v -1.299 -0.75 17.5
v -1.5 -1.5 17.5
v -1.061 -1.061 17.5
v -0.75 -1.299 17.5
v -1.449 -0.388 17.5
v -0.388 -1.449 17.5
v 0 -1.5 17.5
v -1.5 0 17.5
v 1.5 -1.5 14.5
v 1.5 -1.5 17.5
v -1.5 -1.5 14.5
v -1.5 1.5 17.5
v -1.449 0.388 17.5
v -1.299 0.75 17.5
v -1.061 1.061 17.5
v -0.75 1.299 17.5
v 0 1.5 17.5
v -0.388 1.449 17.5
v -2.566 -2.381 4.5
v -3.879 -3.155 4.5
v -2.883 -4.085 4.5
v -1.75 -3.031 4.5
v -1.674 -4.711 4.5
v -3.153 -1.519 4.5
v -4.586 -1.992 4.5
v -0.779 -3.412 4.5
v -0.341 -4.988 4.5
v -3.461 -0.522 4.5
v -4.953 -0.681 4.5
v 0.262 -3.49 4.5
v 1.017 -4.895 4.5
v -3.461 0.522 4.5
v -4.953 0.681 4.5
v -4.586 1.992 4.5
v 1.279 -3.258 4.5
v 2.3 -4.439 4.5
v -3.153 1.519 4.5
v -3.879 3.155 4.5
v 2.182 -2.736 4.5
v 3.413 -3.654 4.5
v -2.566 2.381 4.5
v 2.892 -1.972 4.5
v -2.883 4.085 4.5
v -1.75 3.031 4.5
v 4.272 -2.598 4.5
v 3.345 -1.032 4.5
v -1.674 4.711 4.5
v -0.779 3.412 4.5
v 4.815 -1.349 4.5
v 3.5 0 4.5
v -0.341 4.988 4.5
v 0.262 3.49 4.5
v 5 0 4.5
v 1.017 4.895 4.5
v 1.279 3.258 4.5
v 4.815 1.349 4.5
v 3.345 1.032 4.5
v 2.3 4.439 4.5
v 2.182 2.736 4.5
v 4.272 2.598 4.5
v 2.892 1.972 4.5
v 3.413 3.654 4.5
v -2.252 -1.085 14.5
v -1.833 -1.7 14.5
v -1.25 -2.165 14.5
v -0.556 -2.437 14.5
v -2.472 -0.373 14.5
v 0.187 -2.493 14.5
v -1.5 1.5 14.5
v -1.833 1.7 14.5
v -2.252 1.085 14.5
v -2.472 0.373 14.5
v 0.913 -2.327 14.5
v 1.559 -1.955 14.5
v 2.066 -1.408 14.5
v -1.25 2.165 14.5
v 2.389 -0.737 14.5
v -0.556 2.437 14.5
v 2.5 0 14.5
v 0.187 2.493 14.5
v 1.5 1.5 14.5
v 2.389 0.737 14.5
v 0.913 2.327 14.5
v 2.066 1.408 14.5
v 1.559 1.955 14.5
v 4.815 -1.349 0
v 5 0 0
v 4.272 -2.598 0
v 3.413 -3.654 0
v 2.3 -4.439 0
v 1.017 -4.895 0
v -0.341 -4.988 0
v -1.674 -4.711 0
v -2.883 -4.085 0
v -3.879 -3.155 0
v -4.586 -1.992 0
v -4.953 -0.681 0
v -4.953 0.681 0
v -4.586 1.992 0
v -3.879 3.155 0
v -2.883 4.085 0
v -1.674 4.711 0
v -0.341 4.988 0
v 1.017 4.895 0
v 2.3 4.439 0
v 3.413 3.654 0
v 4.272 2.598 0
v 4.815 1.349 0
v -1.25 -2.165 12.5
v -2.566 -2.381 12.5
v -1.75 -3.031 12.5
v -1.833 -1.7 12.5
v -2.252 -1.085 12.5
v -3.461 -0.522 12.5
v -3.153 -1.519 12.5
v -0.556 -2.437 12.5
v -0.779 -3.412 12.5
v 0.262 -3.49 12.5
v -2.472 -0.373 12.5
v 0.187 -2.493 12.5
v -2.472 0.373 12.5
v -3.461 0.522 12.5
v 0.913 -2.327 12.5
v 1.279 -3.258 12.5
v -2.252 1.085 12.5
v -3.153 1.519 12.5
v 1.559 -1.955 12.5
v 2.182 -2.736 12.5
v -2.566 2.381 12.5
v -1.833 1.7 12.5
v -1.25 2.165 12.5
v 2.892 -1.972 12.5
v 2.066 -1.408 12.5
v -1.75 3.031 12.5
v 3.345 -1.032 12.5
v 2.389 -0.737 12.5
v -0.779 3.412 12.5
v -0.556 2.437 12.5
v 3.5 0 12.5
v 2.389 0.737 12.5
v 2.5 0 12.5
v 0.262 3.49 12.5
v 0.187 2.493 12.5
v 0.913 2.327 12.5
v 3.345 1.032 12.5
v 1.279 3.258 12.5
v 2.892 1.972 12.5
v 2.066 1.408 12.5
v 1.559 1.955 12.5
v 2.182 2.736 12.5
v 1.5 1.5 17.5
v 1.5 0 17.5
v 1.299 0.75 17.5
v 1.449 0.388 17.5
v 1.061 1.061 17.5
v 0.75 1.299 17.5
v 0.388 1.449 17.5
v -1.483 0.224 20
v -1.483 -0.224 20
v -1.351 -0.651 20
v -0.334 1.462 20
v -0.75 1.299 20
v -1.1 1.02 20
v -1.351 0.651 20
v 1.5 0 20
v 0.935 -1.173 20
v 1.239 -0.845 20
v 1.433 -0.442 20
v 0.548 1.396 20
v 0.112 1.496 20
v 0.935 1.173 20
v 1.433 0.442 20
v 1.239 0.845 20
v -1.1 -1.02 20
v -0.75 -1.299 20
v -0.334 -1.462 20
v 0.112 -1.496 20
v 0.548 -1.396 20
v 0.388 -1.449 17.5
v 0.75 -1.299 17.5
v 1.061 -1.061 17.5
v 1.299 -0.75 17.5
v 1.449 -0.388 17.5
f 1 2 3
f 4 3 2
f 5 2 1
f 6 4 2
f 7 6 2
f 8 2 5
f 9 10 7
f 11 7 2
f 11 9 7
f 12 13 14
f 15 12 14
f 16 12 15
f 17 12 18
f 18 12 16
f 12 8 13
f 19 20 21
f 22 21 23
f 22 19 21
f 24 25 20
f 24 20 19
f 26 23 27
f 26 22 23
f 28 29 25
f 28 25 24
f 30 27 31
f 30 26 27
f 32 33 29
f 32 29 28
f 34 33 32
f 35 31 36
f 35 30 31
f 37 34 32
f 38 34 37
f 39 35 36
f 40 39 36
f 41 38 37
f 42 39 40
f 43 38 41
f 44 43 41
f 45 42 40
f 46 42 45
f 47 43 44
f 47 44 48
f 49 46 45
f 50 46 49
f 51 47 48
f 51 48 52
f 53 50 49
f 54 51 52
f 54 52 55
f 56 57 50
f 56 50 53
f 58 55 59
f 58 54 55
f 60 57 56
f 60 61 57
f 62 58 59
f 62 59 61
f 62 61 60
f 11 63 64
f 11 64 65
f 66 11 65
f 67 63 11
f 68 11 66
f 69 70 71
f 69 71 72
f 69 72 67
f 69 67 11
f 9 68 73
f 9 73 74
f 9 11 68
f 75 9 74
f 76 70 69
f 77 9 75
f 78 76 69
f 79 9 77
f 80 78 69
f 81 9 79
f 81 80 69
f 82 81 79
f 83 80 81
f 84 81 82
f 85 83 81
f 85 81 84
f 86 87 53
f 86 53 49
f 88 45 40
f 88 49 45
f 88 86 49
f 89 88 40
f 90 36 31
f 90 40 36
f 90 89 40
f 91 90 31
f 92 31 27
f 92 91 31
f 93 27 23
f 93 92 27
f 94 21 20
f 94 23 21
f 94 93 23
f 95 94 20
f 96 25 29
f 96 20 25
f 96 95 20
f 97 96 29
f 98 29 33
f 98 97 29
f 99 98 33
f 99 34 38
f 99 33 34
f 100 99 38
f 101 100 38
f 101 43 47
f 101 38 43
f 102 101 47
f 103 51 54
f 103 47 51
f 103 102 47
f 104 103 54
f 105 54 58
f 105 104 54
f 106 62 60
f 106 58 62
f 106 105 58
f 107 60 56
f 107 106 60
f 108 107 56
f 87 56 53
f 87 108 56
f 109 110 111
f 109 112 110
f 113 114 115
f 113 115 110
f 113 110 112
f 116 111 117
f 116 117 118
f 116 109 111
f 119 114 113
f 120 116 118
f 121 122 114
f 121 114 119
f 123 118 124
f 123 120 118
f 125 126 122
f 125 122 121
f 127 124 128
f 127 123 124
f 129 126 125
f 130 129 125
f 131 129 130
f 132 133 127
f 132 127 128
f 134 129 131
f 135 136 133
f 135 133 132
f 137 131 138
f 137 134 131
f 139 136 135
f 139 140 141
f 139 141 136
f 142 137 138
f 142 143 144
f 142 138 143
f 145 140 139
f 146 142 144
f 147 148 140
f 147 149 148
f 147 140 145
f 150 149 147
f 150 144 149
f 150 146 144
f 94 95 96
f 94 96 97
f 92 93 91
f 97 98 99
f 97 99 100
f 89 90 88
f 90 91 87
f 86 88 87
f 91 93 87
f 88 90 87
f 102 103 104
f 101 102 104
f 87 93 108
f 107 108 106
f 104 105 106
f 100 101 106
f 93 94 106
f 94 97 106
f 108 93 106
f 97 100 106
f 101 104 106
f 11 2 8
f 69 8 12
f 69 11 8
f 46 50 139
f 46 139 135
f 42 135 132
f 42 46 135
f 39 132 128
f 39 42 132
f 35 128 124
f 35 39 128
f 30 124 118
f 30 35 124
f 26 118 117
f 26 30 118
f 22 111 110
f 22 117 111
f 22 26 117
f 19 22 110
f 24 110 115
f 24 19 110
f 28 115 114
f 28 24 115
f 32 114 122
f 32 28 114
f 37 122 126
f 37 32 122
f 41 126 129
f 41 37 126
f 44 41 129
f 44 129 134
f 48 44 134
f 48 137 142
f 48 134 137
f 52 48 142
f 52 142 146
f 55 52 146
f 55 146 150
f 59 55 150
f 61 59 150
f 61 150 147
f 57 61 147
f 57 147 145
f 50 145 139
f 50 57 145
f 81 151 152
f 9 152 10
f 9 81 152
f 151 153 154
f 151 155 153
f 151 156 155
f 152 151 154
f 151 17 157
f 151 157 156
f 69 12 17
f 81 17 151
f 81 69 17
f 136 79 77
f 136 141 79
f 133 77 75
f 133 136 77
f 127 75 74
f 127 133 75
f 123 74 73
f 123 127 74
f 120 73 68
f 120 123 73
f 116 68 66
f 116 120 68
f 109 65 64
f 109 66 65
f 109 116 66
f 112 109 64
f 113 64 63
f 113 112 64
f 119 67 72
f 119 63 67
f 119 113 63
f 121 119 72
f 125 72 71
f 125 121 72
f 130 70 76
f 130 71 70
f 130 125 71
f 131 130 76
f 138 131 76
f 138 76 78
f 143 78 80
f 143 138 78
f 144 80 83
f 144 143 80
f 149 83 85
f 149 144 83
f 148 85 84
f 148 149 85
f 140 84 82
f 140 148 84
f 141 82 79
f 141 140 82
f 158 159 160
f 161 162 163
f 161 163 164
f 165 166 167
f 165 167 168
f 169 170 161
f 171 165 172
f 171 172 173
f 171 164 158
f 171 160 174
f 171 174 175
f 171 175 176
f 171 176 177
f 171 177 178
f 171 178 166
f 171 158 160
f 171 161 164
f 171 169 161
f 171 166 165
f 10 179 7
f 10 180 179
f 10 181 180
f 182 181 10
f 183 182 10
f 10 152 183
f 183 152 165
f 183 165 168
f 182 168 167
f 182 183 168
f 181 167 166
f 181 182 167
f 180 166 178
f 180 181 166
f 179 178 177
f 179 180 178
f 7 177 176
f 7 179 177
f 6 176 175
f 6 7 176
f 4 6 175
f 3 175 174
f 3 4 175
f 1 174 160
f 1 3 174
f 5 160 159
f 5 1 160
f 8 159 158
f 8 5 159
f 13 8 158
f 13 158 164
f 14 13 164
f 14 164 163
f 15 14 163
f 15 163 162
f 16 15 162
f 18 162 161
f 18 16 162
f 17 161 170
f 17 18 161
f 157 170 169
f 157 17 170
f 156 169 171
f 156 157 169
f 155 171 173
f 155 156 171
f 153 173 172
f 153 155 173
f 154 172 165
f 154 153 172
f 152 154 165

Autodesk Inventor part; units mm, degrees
ref_plane "YZ Plane" through (0, 0, 0) normal (1, 0, 0) x (0, 1, 0)
ref_plane "XZ Plane" through (0, 0, 0) normal (0, 1, 0) x (-1, 0, 0)
ref_plane "XY Plane" through (0, 0, 0) normal (0, 0, 1) x (1, 0, 0)
sketch "Sketch1" plane through (0, 0, 0) normal (0, 0, 1) x (1, 0, 0)
  circle A0 centre (0, 0) radius 5
  dimension "d0" = 10
extrude "Extrusion1" add sketch "Sketch1" along normal blind 4.5
sketch "Sketch2" plane through (0, 0, 4.5) normal (0, 0, 1) x (1, 0, 0)
  circle A0 centre (0, 0) radius 5 projected
  circle A1 centre (0, 0) radius 3.5
  dimension "d3" = 7
extrude "Extrusion2" add sketch "Sketch2" along normal blind 8 contours A1
sketch "Sketch3" plane through (0, 0, 12.5) normal (0, 0, 1) x (1, 0, 0)
  circle A0 centre (0, 0) radius 5 projected
  circle A1 centre (0, 0) radius 2.5
  dimension "d6" = 5
extrude "Extrusion3" add sketch "Sketch3" along normal blind 2 contours A1
sketch "Sketch4" plane through (0, 0, 14.5) normal (0, 0, 1) x (1, 0, 0)
  circle A0 centre (0, 0) radius 2.5 projected
  line L0 (-1.5, 1.5) -> (1.5, 1.5)
  line L1 (1.5, 1.5) -> (1.5, -1.5)
  line L2 (1.5, -1.5) -> (-1.5, -1.5)
  line L3 (-1.5, -1.5) -> (-1.5, 1.5)
  line L4 (-1.5, 1.5) -> (1.5, -1.5) construction
  line L5 (1.5, 1.5) -> (-1.5, -1.5) construction
  dimension "d9" = 3
  dimension "d10" = 3
extrude "Extrusion4" add sketch "Sketch4" along normal blind 3 contours L0 L1 L2 L3
sketch "Sketch5" plane through (0, 0, 17.5) normal (0, 0, 1) x (1, 0, 0)
  circle A0 centre (0, 0) radius 1.5
  dimension "d13" = 3
extrude "Extrusion5" add sketch "Sketch5" along normal blind 2.5
thread "Thread1" size "M3x0.5" class "6g" standard "ANSI Metric M Profile" length 3
properties part number "24 - Valve Disc Spindle" material "Bronze, Soft Tin"
